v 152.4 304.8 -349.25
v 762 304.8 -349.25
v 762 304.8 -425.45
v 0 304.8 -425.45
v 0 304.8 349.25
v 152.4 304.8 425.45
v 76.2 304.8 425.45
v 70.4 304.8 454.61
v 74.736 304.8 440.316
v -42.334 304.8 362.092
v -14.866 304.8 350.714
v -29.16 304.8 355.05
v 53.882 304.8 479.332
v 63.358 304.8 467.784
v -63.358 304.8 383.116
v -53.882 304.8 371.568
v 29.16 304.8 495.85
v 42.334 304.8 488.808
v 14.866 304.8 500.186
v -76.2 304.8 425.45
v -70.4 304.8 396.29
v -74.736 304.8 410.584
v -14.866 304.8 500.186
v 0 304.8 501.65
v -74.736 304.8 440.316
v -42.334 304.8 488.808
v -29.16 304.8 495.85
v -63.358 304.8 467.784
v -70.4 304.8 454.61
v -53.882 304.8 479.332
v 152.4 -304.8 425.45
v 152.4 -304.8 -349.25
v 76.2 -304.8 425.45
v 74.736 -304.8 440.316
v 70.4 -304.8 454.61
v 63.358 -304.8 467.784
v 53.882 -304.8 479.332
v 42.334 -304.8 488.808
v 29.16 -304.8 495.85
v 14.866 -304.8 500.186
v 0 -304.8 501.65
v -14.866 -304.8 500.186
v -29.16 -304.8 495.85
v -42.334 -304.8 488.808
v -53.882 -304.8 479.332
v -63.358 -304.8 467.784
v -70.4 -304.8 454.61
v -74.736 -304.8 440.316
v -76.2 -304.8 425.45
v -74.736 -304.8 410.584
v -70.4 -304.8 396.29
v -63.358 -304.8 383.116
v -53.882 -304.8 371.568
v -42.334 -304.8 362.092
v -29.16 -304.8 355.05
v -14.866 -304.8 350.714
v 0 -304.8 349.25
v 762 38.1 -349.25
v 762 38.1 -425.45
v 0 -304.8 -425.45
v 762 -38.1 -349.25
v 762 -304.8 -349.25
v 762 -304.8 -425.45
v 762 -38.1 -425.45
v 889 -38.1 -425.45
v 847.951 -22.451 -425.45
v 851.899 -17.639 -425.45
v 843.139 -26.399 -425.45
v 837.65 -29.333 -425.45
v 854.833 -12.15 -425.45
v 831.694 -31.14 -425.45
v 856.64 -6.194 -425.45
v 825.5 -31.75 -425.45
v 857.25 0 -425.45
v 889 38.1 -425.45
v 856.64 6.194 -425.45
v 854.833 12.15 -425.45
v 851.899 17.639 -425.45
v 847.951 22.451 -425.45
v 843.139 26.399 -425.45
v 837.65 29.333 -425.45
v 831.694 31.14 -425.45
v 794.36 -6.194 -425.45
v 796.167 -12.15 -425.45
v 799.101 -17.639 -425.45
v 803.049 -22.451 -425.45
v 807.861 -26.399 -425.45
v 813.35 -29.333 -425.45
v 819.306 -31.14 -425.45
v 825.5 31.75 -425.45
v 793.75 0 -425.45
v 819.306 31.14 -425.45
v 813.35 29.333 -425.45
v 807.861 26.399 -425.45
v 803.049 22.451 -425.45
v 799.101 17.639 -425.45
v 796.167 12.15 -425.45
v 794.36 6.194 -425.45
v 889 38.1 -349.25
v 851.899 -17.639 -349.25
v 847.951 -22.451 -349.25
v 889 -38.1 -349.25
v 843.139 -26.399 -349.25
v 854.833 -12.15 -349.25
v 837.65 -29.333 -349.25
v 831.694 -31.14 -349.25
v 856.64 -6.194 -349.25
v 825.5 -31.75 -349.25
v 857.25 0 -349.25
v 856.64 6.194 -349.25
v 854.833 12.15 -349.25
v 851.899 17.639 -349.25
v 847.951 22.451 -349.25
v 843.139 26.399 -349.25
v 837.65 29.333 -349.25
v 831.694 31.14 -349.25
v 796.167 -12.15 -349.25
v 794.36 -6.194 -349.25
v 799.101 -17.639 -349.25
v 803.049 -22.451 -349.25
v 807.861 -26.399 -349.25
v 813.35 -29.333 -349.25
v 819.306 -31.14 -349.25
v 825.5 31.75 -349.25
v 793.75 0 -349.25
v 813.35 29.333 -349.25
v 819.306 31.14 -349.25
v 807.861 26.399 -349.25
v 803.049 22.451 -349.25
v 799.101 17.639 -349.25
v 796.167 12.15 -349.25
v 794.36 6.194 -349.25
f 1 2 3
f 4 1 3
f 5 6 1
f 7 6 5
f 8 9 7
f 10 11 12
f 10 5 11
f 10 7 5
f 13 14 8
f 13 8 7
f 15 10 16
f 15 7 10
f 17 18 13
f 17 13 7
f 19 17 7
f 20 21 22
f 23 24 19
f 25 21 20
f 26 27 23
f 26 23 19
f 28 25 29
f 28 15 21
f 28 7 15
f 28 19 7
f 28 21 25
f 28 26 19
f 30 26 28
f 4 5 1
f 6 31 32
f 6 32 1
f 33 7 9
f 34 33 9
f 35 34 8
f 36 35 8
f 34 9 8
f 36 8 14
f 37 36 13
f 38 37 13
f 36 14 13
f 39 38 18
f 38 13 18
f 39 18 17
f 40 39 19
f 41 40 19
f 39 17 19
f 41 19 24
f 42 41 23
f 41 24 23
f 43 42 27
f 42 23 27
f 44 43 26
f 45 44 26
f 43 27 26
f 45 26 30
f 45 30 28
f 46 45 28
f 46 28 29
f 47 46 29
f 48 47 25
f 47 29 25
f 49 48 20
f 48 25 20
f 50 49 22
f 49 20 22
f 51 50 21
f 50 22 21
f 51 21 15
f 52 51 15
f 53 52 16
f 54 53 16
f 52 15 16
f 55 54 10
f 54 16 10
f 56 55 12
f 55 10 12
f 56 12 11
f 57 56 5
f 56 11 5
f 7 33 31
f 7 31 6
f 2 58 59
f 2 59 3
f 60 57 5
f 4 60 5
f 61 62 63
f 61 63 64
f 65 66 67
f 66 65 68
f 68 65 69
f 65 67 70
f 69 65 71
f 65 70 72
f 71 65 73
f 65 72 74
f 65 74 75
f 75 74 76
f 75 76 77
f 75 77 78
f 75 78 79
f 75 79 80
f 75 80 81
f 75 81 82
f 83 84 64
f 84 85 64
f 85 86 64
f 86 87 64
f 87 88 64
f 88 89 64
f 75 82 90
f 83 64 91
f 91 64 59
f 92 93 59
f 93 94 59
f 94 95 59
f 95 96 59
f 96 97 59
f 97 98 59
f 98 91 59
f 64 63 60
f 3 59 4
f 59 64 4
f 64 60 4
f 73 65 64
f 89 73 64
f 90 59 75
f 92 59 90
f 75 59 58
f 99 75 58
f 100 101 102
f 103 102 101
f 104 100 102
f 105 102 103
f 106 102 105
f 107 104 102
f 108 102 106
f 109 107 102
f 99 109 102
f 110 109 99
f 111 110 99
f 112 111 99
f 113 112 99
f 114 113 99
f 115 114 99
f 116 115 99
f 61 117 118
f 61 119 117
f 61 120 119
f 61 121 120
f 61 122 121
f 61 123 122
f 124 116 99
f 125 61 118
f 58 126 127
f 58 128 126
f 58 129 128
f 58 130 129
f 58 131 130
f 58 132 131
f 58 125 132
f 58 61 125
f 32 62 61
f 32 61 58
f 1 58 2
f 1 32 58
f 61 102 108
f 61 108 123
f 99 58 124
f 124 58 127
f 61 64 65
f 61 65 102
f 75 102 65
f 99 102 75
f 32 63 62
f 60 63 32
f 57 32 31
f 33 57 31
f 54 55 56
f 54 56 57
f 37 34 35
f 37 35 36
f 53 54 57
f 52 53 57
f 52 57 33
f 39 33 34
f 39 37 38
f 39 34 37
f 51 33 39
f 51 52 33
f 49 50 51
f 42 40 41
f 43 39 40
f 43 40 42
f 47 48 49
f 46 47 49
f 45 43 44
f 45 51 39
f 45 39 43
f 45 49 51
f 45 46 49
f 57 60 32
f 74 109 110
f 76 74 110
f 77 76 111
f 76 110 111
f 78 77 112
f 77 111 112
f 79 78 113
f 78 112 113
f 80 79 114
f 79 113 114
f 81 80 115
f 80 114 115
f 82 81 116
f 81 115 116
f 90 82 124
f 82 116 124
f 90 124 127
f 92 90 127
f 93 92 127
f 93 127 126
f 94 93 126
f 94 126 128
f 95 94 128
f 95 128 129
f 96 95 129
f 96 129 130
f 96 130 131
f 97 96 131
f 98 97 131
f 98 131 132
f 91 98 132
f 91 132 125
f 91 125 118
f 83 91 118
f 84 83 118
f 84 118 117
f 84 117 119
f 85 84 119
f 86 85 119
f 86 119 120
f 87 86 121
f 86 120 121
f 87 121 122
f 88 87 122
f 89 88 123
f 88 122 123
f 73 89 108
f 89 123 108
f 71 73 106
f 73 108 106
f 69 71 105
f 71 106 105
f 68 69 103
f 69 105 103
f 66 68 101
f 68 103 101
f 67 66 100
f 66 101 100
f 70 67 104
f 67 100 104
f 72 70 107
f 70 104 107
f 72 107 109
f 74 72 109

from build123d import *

# Parameters (mm, degrees)
F0_W     = 609.6
F0_H     = 850.9
F1_DEPTH = 152.4
F2_W     = 609.6
F2_H     = 76.2
F3_DEPTH = 609.6
F4_W     = 76.2
F4_H     = 76.2
F5_DEPTH = 127
F6_R     = 31.75
F7_DEPTH = 137.16
F8_W     = 76.2
F8_H     = 609.6


with BuildPart() as f1:
    # F0 (on Right) → F1 (new body)
    with BuildSketch(Plane.YZ):
        Rectangle(F0_W, F0_H)
    extrude(amount=F1_DEPTH)

    # F2 (on face) → F3 (join)
    with BuildSketch(Plane.YZ.offset(152.4)):
        with Locations((0, -387.35)):
            Rectangle(F2_W, F2_H)
    extrude(amount=F3_DEPTH)

    # F4 (on face) → F5 (join)
    with BuildSketch(Plane.YZ.offset(762)):
        with Locations((0, -387.35)):
            Rectangle(F4_W, F4_H)
    extrude(amount=F5_DEPTH)

    # F6 (on face) → F7 (cut)
    with BuildSketch(Plane.XY.offset(-349.25)):
        with Locations((825.5, 0)):
            Circle(F6_R)
    extrude(amount=-F7_DEPTH, mode=Mode.SUBTRACT)

    # F8 (on face) → F9 (revolve)
    with BuildSketch(Plane.XY.offset(425.45)):
        with Locations((38.1, 0)):
            Rectangle(F8_W, F8_H)
    revolve(axis=Axis((0, 0, 425.45), (0, -1, 0)))


solid = f1.part
